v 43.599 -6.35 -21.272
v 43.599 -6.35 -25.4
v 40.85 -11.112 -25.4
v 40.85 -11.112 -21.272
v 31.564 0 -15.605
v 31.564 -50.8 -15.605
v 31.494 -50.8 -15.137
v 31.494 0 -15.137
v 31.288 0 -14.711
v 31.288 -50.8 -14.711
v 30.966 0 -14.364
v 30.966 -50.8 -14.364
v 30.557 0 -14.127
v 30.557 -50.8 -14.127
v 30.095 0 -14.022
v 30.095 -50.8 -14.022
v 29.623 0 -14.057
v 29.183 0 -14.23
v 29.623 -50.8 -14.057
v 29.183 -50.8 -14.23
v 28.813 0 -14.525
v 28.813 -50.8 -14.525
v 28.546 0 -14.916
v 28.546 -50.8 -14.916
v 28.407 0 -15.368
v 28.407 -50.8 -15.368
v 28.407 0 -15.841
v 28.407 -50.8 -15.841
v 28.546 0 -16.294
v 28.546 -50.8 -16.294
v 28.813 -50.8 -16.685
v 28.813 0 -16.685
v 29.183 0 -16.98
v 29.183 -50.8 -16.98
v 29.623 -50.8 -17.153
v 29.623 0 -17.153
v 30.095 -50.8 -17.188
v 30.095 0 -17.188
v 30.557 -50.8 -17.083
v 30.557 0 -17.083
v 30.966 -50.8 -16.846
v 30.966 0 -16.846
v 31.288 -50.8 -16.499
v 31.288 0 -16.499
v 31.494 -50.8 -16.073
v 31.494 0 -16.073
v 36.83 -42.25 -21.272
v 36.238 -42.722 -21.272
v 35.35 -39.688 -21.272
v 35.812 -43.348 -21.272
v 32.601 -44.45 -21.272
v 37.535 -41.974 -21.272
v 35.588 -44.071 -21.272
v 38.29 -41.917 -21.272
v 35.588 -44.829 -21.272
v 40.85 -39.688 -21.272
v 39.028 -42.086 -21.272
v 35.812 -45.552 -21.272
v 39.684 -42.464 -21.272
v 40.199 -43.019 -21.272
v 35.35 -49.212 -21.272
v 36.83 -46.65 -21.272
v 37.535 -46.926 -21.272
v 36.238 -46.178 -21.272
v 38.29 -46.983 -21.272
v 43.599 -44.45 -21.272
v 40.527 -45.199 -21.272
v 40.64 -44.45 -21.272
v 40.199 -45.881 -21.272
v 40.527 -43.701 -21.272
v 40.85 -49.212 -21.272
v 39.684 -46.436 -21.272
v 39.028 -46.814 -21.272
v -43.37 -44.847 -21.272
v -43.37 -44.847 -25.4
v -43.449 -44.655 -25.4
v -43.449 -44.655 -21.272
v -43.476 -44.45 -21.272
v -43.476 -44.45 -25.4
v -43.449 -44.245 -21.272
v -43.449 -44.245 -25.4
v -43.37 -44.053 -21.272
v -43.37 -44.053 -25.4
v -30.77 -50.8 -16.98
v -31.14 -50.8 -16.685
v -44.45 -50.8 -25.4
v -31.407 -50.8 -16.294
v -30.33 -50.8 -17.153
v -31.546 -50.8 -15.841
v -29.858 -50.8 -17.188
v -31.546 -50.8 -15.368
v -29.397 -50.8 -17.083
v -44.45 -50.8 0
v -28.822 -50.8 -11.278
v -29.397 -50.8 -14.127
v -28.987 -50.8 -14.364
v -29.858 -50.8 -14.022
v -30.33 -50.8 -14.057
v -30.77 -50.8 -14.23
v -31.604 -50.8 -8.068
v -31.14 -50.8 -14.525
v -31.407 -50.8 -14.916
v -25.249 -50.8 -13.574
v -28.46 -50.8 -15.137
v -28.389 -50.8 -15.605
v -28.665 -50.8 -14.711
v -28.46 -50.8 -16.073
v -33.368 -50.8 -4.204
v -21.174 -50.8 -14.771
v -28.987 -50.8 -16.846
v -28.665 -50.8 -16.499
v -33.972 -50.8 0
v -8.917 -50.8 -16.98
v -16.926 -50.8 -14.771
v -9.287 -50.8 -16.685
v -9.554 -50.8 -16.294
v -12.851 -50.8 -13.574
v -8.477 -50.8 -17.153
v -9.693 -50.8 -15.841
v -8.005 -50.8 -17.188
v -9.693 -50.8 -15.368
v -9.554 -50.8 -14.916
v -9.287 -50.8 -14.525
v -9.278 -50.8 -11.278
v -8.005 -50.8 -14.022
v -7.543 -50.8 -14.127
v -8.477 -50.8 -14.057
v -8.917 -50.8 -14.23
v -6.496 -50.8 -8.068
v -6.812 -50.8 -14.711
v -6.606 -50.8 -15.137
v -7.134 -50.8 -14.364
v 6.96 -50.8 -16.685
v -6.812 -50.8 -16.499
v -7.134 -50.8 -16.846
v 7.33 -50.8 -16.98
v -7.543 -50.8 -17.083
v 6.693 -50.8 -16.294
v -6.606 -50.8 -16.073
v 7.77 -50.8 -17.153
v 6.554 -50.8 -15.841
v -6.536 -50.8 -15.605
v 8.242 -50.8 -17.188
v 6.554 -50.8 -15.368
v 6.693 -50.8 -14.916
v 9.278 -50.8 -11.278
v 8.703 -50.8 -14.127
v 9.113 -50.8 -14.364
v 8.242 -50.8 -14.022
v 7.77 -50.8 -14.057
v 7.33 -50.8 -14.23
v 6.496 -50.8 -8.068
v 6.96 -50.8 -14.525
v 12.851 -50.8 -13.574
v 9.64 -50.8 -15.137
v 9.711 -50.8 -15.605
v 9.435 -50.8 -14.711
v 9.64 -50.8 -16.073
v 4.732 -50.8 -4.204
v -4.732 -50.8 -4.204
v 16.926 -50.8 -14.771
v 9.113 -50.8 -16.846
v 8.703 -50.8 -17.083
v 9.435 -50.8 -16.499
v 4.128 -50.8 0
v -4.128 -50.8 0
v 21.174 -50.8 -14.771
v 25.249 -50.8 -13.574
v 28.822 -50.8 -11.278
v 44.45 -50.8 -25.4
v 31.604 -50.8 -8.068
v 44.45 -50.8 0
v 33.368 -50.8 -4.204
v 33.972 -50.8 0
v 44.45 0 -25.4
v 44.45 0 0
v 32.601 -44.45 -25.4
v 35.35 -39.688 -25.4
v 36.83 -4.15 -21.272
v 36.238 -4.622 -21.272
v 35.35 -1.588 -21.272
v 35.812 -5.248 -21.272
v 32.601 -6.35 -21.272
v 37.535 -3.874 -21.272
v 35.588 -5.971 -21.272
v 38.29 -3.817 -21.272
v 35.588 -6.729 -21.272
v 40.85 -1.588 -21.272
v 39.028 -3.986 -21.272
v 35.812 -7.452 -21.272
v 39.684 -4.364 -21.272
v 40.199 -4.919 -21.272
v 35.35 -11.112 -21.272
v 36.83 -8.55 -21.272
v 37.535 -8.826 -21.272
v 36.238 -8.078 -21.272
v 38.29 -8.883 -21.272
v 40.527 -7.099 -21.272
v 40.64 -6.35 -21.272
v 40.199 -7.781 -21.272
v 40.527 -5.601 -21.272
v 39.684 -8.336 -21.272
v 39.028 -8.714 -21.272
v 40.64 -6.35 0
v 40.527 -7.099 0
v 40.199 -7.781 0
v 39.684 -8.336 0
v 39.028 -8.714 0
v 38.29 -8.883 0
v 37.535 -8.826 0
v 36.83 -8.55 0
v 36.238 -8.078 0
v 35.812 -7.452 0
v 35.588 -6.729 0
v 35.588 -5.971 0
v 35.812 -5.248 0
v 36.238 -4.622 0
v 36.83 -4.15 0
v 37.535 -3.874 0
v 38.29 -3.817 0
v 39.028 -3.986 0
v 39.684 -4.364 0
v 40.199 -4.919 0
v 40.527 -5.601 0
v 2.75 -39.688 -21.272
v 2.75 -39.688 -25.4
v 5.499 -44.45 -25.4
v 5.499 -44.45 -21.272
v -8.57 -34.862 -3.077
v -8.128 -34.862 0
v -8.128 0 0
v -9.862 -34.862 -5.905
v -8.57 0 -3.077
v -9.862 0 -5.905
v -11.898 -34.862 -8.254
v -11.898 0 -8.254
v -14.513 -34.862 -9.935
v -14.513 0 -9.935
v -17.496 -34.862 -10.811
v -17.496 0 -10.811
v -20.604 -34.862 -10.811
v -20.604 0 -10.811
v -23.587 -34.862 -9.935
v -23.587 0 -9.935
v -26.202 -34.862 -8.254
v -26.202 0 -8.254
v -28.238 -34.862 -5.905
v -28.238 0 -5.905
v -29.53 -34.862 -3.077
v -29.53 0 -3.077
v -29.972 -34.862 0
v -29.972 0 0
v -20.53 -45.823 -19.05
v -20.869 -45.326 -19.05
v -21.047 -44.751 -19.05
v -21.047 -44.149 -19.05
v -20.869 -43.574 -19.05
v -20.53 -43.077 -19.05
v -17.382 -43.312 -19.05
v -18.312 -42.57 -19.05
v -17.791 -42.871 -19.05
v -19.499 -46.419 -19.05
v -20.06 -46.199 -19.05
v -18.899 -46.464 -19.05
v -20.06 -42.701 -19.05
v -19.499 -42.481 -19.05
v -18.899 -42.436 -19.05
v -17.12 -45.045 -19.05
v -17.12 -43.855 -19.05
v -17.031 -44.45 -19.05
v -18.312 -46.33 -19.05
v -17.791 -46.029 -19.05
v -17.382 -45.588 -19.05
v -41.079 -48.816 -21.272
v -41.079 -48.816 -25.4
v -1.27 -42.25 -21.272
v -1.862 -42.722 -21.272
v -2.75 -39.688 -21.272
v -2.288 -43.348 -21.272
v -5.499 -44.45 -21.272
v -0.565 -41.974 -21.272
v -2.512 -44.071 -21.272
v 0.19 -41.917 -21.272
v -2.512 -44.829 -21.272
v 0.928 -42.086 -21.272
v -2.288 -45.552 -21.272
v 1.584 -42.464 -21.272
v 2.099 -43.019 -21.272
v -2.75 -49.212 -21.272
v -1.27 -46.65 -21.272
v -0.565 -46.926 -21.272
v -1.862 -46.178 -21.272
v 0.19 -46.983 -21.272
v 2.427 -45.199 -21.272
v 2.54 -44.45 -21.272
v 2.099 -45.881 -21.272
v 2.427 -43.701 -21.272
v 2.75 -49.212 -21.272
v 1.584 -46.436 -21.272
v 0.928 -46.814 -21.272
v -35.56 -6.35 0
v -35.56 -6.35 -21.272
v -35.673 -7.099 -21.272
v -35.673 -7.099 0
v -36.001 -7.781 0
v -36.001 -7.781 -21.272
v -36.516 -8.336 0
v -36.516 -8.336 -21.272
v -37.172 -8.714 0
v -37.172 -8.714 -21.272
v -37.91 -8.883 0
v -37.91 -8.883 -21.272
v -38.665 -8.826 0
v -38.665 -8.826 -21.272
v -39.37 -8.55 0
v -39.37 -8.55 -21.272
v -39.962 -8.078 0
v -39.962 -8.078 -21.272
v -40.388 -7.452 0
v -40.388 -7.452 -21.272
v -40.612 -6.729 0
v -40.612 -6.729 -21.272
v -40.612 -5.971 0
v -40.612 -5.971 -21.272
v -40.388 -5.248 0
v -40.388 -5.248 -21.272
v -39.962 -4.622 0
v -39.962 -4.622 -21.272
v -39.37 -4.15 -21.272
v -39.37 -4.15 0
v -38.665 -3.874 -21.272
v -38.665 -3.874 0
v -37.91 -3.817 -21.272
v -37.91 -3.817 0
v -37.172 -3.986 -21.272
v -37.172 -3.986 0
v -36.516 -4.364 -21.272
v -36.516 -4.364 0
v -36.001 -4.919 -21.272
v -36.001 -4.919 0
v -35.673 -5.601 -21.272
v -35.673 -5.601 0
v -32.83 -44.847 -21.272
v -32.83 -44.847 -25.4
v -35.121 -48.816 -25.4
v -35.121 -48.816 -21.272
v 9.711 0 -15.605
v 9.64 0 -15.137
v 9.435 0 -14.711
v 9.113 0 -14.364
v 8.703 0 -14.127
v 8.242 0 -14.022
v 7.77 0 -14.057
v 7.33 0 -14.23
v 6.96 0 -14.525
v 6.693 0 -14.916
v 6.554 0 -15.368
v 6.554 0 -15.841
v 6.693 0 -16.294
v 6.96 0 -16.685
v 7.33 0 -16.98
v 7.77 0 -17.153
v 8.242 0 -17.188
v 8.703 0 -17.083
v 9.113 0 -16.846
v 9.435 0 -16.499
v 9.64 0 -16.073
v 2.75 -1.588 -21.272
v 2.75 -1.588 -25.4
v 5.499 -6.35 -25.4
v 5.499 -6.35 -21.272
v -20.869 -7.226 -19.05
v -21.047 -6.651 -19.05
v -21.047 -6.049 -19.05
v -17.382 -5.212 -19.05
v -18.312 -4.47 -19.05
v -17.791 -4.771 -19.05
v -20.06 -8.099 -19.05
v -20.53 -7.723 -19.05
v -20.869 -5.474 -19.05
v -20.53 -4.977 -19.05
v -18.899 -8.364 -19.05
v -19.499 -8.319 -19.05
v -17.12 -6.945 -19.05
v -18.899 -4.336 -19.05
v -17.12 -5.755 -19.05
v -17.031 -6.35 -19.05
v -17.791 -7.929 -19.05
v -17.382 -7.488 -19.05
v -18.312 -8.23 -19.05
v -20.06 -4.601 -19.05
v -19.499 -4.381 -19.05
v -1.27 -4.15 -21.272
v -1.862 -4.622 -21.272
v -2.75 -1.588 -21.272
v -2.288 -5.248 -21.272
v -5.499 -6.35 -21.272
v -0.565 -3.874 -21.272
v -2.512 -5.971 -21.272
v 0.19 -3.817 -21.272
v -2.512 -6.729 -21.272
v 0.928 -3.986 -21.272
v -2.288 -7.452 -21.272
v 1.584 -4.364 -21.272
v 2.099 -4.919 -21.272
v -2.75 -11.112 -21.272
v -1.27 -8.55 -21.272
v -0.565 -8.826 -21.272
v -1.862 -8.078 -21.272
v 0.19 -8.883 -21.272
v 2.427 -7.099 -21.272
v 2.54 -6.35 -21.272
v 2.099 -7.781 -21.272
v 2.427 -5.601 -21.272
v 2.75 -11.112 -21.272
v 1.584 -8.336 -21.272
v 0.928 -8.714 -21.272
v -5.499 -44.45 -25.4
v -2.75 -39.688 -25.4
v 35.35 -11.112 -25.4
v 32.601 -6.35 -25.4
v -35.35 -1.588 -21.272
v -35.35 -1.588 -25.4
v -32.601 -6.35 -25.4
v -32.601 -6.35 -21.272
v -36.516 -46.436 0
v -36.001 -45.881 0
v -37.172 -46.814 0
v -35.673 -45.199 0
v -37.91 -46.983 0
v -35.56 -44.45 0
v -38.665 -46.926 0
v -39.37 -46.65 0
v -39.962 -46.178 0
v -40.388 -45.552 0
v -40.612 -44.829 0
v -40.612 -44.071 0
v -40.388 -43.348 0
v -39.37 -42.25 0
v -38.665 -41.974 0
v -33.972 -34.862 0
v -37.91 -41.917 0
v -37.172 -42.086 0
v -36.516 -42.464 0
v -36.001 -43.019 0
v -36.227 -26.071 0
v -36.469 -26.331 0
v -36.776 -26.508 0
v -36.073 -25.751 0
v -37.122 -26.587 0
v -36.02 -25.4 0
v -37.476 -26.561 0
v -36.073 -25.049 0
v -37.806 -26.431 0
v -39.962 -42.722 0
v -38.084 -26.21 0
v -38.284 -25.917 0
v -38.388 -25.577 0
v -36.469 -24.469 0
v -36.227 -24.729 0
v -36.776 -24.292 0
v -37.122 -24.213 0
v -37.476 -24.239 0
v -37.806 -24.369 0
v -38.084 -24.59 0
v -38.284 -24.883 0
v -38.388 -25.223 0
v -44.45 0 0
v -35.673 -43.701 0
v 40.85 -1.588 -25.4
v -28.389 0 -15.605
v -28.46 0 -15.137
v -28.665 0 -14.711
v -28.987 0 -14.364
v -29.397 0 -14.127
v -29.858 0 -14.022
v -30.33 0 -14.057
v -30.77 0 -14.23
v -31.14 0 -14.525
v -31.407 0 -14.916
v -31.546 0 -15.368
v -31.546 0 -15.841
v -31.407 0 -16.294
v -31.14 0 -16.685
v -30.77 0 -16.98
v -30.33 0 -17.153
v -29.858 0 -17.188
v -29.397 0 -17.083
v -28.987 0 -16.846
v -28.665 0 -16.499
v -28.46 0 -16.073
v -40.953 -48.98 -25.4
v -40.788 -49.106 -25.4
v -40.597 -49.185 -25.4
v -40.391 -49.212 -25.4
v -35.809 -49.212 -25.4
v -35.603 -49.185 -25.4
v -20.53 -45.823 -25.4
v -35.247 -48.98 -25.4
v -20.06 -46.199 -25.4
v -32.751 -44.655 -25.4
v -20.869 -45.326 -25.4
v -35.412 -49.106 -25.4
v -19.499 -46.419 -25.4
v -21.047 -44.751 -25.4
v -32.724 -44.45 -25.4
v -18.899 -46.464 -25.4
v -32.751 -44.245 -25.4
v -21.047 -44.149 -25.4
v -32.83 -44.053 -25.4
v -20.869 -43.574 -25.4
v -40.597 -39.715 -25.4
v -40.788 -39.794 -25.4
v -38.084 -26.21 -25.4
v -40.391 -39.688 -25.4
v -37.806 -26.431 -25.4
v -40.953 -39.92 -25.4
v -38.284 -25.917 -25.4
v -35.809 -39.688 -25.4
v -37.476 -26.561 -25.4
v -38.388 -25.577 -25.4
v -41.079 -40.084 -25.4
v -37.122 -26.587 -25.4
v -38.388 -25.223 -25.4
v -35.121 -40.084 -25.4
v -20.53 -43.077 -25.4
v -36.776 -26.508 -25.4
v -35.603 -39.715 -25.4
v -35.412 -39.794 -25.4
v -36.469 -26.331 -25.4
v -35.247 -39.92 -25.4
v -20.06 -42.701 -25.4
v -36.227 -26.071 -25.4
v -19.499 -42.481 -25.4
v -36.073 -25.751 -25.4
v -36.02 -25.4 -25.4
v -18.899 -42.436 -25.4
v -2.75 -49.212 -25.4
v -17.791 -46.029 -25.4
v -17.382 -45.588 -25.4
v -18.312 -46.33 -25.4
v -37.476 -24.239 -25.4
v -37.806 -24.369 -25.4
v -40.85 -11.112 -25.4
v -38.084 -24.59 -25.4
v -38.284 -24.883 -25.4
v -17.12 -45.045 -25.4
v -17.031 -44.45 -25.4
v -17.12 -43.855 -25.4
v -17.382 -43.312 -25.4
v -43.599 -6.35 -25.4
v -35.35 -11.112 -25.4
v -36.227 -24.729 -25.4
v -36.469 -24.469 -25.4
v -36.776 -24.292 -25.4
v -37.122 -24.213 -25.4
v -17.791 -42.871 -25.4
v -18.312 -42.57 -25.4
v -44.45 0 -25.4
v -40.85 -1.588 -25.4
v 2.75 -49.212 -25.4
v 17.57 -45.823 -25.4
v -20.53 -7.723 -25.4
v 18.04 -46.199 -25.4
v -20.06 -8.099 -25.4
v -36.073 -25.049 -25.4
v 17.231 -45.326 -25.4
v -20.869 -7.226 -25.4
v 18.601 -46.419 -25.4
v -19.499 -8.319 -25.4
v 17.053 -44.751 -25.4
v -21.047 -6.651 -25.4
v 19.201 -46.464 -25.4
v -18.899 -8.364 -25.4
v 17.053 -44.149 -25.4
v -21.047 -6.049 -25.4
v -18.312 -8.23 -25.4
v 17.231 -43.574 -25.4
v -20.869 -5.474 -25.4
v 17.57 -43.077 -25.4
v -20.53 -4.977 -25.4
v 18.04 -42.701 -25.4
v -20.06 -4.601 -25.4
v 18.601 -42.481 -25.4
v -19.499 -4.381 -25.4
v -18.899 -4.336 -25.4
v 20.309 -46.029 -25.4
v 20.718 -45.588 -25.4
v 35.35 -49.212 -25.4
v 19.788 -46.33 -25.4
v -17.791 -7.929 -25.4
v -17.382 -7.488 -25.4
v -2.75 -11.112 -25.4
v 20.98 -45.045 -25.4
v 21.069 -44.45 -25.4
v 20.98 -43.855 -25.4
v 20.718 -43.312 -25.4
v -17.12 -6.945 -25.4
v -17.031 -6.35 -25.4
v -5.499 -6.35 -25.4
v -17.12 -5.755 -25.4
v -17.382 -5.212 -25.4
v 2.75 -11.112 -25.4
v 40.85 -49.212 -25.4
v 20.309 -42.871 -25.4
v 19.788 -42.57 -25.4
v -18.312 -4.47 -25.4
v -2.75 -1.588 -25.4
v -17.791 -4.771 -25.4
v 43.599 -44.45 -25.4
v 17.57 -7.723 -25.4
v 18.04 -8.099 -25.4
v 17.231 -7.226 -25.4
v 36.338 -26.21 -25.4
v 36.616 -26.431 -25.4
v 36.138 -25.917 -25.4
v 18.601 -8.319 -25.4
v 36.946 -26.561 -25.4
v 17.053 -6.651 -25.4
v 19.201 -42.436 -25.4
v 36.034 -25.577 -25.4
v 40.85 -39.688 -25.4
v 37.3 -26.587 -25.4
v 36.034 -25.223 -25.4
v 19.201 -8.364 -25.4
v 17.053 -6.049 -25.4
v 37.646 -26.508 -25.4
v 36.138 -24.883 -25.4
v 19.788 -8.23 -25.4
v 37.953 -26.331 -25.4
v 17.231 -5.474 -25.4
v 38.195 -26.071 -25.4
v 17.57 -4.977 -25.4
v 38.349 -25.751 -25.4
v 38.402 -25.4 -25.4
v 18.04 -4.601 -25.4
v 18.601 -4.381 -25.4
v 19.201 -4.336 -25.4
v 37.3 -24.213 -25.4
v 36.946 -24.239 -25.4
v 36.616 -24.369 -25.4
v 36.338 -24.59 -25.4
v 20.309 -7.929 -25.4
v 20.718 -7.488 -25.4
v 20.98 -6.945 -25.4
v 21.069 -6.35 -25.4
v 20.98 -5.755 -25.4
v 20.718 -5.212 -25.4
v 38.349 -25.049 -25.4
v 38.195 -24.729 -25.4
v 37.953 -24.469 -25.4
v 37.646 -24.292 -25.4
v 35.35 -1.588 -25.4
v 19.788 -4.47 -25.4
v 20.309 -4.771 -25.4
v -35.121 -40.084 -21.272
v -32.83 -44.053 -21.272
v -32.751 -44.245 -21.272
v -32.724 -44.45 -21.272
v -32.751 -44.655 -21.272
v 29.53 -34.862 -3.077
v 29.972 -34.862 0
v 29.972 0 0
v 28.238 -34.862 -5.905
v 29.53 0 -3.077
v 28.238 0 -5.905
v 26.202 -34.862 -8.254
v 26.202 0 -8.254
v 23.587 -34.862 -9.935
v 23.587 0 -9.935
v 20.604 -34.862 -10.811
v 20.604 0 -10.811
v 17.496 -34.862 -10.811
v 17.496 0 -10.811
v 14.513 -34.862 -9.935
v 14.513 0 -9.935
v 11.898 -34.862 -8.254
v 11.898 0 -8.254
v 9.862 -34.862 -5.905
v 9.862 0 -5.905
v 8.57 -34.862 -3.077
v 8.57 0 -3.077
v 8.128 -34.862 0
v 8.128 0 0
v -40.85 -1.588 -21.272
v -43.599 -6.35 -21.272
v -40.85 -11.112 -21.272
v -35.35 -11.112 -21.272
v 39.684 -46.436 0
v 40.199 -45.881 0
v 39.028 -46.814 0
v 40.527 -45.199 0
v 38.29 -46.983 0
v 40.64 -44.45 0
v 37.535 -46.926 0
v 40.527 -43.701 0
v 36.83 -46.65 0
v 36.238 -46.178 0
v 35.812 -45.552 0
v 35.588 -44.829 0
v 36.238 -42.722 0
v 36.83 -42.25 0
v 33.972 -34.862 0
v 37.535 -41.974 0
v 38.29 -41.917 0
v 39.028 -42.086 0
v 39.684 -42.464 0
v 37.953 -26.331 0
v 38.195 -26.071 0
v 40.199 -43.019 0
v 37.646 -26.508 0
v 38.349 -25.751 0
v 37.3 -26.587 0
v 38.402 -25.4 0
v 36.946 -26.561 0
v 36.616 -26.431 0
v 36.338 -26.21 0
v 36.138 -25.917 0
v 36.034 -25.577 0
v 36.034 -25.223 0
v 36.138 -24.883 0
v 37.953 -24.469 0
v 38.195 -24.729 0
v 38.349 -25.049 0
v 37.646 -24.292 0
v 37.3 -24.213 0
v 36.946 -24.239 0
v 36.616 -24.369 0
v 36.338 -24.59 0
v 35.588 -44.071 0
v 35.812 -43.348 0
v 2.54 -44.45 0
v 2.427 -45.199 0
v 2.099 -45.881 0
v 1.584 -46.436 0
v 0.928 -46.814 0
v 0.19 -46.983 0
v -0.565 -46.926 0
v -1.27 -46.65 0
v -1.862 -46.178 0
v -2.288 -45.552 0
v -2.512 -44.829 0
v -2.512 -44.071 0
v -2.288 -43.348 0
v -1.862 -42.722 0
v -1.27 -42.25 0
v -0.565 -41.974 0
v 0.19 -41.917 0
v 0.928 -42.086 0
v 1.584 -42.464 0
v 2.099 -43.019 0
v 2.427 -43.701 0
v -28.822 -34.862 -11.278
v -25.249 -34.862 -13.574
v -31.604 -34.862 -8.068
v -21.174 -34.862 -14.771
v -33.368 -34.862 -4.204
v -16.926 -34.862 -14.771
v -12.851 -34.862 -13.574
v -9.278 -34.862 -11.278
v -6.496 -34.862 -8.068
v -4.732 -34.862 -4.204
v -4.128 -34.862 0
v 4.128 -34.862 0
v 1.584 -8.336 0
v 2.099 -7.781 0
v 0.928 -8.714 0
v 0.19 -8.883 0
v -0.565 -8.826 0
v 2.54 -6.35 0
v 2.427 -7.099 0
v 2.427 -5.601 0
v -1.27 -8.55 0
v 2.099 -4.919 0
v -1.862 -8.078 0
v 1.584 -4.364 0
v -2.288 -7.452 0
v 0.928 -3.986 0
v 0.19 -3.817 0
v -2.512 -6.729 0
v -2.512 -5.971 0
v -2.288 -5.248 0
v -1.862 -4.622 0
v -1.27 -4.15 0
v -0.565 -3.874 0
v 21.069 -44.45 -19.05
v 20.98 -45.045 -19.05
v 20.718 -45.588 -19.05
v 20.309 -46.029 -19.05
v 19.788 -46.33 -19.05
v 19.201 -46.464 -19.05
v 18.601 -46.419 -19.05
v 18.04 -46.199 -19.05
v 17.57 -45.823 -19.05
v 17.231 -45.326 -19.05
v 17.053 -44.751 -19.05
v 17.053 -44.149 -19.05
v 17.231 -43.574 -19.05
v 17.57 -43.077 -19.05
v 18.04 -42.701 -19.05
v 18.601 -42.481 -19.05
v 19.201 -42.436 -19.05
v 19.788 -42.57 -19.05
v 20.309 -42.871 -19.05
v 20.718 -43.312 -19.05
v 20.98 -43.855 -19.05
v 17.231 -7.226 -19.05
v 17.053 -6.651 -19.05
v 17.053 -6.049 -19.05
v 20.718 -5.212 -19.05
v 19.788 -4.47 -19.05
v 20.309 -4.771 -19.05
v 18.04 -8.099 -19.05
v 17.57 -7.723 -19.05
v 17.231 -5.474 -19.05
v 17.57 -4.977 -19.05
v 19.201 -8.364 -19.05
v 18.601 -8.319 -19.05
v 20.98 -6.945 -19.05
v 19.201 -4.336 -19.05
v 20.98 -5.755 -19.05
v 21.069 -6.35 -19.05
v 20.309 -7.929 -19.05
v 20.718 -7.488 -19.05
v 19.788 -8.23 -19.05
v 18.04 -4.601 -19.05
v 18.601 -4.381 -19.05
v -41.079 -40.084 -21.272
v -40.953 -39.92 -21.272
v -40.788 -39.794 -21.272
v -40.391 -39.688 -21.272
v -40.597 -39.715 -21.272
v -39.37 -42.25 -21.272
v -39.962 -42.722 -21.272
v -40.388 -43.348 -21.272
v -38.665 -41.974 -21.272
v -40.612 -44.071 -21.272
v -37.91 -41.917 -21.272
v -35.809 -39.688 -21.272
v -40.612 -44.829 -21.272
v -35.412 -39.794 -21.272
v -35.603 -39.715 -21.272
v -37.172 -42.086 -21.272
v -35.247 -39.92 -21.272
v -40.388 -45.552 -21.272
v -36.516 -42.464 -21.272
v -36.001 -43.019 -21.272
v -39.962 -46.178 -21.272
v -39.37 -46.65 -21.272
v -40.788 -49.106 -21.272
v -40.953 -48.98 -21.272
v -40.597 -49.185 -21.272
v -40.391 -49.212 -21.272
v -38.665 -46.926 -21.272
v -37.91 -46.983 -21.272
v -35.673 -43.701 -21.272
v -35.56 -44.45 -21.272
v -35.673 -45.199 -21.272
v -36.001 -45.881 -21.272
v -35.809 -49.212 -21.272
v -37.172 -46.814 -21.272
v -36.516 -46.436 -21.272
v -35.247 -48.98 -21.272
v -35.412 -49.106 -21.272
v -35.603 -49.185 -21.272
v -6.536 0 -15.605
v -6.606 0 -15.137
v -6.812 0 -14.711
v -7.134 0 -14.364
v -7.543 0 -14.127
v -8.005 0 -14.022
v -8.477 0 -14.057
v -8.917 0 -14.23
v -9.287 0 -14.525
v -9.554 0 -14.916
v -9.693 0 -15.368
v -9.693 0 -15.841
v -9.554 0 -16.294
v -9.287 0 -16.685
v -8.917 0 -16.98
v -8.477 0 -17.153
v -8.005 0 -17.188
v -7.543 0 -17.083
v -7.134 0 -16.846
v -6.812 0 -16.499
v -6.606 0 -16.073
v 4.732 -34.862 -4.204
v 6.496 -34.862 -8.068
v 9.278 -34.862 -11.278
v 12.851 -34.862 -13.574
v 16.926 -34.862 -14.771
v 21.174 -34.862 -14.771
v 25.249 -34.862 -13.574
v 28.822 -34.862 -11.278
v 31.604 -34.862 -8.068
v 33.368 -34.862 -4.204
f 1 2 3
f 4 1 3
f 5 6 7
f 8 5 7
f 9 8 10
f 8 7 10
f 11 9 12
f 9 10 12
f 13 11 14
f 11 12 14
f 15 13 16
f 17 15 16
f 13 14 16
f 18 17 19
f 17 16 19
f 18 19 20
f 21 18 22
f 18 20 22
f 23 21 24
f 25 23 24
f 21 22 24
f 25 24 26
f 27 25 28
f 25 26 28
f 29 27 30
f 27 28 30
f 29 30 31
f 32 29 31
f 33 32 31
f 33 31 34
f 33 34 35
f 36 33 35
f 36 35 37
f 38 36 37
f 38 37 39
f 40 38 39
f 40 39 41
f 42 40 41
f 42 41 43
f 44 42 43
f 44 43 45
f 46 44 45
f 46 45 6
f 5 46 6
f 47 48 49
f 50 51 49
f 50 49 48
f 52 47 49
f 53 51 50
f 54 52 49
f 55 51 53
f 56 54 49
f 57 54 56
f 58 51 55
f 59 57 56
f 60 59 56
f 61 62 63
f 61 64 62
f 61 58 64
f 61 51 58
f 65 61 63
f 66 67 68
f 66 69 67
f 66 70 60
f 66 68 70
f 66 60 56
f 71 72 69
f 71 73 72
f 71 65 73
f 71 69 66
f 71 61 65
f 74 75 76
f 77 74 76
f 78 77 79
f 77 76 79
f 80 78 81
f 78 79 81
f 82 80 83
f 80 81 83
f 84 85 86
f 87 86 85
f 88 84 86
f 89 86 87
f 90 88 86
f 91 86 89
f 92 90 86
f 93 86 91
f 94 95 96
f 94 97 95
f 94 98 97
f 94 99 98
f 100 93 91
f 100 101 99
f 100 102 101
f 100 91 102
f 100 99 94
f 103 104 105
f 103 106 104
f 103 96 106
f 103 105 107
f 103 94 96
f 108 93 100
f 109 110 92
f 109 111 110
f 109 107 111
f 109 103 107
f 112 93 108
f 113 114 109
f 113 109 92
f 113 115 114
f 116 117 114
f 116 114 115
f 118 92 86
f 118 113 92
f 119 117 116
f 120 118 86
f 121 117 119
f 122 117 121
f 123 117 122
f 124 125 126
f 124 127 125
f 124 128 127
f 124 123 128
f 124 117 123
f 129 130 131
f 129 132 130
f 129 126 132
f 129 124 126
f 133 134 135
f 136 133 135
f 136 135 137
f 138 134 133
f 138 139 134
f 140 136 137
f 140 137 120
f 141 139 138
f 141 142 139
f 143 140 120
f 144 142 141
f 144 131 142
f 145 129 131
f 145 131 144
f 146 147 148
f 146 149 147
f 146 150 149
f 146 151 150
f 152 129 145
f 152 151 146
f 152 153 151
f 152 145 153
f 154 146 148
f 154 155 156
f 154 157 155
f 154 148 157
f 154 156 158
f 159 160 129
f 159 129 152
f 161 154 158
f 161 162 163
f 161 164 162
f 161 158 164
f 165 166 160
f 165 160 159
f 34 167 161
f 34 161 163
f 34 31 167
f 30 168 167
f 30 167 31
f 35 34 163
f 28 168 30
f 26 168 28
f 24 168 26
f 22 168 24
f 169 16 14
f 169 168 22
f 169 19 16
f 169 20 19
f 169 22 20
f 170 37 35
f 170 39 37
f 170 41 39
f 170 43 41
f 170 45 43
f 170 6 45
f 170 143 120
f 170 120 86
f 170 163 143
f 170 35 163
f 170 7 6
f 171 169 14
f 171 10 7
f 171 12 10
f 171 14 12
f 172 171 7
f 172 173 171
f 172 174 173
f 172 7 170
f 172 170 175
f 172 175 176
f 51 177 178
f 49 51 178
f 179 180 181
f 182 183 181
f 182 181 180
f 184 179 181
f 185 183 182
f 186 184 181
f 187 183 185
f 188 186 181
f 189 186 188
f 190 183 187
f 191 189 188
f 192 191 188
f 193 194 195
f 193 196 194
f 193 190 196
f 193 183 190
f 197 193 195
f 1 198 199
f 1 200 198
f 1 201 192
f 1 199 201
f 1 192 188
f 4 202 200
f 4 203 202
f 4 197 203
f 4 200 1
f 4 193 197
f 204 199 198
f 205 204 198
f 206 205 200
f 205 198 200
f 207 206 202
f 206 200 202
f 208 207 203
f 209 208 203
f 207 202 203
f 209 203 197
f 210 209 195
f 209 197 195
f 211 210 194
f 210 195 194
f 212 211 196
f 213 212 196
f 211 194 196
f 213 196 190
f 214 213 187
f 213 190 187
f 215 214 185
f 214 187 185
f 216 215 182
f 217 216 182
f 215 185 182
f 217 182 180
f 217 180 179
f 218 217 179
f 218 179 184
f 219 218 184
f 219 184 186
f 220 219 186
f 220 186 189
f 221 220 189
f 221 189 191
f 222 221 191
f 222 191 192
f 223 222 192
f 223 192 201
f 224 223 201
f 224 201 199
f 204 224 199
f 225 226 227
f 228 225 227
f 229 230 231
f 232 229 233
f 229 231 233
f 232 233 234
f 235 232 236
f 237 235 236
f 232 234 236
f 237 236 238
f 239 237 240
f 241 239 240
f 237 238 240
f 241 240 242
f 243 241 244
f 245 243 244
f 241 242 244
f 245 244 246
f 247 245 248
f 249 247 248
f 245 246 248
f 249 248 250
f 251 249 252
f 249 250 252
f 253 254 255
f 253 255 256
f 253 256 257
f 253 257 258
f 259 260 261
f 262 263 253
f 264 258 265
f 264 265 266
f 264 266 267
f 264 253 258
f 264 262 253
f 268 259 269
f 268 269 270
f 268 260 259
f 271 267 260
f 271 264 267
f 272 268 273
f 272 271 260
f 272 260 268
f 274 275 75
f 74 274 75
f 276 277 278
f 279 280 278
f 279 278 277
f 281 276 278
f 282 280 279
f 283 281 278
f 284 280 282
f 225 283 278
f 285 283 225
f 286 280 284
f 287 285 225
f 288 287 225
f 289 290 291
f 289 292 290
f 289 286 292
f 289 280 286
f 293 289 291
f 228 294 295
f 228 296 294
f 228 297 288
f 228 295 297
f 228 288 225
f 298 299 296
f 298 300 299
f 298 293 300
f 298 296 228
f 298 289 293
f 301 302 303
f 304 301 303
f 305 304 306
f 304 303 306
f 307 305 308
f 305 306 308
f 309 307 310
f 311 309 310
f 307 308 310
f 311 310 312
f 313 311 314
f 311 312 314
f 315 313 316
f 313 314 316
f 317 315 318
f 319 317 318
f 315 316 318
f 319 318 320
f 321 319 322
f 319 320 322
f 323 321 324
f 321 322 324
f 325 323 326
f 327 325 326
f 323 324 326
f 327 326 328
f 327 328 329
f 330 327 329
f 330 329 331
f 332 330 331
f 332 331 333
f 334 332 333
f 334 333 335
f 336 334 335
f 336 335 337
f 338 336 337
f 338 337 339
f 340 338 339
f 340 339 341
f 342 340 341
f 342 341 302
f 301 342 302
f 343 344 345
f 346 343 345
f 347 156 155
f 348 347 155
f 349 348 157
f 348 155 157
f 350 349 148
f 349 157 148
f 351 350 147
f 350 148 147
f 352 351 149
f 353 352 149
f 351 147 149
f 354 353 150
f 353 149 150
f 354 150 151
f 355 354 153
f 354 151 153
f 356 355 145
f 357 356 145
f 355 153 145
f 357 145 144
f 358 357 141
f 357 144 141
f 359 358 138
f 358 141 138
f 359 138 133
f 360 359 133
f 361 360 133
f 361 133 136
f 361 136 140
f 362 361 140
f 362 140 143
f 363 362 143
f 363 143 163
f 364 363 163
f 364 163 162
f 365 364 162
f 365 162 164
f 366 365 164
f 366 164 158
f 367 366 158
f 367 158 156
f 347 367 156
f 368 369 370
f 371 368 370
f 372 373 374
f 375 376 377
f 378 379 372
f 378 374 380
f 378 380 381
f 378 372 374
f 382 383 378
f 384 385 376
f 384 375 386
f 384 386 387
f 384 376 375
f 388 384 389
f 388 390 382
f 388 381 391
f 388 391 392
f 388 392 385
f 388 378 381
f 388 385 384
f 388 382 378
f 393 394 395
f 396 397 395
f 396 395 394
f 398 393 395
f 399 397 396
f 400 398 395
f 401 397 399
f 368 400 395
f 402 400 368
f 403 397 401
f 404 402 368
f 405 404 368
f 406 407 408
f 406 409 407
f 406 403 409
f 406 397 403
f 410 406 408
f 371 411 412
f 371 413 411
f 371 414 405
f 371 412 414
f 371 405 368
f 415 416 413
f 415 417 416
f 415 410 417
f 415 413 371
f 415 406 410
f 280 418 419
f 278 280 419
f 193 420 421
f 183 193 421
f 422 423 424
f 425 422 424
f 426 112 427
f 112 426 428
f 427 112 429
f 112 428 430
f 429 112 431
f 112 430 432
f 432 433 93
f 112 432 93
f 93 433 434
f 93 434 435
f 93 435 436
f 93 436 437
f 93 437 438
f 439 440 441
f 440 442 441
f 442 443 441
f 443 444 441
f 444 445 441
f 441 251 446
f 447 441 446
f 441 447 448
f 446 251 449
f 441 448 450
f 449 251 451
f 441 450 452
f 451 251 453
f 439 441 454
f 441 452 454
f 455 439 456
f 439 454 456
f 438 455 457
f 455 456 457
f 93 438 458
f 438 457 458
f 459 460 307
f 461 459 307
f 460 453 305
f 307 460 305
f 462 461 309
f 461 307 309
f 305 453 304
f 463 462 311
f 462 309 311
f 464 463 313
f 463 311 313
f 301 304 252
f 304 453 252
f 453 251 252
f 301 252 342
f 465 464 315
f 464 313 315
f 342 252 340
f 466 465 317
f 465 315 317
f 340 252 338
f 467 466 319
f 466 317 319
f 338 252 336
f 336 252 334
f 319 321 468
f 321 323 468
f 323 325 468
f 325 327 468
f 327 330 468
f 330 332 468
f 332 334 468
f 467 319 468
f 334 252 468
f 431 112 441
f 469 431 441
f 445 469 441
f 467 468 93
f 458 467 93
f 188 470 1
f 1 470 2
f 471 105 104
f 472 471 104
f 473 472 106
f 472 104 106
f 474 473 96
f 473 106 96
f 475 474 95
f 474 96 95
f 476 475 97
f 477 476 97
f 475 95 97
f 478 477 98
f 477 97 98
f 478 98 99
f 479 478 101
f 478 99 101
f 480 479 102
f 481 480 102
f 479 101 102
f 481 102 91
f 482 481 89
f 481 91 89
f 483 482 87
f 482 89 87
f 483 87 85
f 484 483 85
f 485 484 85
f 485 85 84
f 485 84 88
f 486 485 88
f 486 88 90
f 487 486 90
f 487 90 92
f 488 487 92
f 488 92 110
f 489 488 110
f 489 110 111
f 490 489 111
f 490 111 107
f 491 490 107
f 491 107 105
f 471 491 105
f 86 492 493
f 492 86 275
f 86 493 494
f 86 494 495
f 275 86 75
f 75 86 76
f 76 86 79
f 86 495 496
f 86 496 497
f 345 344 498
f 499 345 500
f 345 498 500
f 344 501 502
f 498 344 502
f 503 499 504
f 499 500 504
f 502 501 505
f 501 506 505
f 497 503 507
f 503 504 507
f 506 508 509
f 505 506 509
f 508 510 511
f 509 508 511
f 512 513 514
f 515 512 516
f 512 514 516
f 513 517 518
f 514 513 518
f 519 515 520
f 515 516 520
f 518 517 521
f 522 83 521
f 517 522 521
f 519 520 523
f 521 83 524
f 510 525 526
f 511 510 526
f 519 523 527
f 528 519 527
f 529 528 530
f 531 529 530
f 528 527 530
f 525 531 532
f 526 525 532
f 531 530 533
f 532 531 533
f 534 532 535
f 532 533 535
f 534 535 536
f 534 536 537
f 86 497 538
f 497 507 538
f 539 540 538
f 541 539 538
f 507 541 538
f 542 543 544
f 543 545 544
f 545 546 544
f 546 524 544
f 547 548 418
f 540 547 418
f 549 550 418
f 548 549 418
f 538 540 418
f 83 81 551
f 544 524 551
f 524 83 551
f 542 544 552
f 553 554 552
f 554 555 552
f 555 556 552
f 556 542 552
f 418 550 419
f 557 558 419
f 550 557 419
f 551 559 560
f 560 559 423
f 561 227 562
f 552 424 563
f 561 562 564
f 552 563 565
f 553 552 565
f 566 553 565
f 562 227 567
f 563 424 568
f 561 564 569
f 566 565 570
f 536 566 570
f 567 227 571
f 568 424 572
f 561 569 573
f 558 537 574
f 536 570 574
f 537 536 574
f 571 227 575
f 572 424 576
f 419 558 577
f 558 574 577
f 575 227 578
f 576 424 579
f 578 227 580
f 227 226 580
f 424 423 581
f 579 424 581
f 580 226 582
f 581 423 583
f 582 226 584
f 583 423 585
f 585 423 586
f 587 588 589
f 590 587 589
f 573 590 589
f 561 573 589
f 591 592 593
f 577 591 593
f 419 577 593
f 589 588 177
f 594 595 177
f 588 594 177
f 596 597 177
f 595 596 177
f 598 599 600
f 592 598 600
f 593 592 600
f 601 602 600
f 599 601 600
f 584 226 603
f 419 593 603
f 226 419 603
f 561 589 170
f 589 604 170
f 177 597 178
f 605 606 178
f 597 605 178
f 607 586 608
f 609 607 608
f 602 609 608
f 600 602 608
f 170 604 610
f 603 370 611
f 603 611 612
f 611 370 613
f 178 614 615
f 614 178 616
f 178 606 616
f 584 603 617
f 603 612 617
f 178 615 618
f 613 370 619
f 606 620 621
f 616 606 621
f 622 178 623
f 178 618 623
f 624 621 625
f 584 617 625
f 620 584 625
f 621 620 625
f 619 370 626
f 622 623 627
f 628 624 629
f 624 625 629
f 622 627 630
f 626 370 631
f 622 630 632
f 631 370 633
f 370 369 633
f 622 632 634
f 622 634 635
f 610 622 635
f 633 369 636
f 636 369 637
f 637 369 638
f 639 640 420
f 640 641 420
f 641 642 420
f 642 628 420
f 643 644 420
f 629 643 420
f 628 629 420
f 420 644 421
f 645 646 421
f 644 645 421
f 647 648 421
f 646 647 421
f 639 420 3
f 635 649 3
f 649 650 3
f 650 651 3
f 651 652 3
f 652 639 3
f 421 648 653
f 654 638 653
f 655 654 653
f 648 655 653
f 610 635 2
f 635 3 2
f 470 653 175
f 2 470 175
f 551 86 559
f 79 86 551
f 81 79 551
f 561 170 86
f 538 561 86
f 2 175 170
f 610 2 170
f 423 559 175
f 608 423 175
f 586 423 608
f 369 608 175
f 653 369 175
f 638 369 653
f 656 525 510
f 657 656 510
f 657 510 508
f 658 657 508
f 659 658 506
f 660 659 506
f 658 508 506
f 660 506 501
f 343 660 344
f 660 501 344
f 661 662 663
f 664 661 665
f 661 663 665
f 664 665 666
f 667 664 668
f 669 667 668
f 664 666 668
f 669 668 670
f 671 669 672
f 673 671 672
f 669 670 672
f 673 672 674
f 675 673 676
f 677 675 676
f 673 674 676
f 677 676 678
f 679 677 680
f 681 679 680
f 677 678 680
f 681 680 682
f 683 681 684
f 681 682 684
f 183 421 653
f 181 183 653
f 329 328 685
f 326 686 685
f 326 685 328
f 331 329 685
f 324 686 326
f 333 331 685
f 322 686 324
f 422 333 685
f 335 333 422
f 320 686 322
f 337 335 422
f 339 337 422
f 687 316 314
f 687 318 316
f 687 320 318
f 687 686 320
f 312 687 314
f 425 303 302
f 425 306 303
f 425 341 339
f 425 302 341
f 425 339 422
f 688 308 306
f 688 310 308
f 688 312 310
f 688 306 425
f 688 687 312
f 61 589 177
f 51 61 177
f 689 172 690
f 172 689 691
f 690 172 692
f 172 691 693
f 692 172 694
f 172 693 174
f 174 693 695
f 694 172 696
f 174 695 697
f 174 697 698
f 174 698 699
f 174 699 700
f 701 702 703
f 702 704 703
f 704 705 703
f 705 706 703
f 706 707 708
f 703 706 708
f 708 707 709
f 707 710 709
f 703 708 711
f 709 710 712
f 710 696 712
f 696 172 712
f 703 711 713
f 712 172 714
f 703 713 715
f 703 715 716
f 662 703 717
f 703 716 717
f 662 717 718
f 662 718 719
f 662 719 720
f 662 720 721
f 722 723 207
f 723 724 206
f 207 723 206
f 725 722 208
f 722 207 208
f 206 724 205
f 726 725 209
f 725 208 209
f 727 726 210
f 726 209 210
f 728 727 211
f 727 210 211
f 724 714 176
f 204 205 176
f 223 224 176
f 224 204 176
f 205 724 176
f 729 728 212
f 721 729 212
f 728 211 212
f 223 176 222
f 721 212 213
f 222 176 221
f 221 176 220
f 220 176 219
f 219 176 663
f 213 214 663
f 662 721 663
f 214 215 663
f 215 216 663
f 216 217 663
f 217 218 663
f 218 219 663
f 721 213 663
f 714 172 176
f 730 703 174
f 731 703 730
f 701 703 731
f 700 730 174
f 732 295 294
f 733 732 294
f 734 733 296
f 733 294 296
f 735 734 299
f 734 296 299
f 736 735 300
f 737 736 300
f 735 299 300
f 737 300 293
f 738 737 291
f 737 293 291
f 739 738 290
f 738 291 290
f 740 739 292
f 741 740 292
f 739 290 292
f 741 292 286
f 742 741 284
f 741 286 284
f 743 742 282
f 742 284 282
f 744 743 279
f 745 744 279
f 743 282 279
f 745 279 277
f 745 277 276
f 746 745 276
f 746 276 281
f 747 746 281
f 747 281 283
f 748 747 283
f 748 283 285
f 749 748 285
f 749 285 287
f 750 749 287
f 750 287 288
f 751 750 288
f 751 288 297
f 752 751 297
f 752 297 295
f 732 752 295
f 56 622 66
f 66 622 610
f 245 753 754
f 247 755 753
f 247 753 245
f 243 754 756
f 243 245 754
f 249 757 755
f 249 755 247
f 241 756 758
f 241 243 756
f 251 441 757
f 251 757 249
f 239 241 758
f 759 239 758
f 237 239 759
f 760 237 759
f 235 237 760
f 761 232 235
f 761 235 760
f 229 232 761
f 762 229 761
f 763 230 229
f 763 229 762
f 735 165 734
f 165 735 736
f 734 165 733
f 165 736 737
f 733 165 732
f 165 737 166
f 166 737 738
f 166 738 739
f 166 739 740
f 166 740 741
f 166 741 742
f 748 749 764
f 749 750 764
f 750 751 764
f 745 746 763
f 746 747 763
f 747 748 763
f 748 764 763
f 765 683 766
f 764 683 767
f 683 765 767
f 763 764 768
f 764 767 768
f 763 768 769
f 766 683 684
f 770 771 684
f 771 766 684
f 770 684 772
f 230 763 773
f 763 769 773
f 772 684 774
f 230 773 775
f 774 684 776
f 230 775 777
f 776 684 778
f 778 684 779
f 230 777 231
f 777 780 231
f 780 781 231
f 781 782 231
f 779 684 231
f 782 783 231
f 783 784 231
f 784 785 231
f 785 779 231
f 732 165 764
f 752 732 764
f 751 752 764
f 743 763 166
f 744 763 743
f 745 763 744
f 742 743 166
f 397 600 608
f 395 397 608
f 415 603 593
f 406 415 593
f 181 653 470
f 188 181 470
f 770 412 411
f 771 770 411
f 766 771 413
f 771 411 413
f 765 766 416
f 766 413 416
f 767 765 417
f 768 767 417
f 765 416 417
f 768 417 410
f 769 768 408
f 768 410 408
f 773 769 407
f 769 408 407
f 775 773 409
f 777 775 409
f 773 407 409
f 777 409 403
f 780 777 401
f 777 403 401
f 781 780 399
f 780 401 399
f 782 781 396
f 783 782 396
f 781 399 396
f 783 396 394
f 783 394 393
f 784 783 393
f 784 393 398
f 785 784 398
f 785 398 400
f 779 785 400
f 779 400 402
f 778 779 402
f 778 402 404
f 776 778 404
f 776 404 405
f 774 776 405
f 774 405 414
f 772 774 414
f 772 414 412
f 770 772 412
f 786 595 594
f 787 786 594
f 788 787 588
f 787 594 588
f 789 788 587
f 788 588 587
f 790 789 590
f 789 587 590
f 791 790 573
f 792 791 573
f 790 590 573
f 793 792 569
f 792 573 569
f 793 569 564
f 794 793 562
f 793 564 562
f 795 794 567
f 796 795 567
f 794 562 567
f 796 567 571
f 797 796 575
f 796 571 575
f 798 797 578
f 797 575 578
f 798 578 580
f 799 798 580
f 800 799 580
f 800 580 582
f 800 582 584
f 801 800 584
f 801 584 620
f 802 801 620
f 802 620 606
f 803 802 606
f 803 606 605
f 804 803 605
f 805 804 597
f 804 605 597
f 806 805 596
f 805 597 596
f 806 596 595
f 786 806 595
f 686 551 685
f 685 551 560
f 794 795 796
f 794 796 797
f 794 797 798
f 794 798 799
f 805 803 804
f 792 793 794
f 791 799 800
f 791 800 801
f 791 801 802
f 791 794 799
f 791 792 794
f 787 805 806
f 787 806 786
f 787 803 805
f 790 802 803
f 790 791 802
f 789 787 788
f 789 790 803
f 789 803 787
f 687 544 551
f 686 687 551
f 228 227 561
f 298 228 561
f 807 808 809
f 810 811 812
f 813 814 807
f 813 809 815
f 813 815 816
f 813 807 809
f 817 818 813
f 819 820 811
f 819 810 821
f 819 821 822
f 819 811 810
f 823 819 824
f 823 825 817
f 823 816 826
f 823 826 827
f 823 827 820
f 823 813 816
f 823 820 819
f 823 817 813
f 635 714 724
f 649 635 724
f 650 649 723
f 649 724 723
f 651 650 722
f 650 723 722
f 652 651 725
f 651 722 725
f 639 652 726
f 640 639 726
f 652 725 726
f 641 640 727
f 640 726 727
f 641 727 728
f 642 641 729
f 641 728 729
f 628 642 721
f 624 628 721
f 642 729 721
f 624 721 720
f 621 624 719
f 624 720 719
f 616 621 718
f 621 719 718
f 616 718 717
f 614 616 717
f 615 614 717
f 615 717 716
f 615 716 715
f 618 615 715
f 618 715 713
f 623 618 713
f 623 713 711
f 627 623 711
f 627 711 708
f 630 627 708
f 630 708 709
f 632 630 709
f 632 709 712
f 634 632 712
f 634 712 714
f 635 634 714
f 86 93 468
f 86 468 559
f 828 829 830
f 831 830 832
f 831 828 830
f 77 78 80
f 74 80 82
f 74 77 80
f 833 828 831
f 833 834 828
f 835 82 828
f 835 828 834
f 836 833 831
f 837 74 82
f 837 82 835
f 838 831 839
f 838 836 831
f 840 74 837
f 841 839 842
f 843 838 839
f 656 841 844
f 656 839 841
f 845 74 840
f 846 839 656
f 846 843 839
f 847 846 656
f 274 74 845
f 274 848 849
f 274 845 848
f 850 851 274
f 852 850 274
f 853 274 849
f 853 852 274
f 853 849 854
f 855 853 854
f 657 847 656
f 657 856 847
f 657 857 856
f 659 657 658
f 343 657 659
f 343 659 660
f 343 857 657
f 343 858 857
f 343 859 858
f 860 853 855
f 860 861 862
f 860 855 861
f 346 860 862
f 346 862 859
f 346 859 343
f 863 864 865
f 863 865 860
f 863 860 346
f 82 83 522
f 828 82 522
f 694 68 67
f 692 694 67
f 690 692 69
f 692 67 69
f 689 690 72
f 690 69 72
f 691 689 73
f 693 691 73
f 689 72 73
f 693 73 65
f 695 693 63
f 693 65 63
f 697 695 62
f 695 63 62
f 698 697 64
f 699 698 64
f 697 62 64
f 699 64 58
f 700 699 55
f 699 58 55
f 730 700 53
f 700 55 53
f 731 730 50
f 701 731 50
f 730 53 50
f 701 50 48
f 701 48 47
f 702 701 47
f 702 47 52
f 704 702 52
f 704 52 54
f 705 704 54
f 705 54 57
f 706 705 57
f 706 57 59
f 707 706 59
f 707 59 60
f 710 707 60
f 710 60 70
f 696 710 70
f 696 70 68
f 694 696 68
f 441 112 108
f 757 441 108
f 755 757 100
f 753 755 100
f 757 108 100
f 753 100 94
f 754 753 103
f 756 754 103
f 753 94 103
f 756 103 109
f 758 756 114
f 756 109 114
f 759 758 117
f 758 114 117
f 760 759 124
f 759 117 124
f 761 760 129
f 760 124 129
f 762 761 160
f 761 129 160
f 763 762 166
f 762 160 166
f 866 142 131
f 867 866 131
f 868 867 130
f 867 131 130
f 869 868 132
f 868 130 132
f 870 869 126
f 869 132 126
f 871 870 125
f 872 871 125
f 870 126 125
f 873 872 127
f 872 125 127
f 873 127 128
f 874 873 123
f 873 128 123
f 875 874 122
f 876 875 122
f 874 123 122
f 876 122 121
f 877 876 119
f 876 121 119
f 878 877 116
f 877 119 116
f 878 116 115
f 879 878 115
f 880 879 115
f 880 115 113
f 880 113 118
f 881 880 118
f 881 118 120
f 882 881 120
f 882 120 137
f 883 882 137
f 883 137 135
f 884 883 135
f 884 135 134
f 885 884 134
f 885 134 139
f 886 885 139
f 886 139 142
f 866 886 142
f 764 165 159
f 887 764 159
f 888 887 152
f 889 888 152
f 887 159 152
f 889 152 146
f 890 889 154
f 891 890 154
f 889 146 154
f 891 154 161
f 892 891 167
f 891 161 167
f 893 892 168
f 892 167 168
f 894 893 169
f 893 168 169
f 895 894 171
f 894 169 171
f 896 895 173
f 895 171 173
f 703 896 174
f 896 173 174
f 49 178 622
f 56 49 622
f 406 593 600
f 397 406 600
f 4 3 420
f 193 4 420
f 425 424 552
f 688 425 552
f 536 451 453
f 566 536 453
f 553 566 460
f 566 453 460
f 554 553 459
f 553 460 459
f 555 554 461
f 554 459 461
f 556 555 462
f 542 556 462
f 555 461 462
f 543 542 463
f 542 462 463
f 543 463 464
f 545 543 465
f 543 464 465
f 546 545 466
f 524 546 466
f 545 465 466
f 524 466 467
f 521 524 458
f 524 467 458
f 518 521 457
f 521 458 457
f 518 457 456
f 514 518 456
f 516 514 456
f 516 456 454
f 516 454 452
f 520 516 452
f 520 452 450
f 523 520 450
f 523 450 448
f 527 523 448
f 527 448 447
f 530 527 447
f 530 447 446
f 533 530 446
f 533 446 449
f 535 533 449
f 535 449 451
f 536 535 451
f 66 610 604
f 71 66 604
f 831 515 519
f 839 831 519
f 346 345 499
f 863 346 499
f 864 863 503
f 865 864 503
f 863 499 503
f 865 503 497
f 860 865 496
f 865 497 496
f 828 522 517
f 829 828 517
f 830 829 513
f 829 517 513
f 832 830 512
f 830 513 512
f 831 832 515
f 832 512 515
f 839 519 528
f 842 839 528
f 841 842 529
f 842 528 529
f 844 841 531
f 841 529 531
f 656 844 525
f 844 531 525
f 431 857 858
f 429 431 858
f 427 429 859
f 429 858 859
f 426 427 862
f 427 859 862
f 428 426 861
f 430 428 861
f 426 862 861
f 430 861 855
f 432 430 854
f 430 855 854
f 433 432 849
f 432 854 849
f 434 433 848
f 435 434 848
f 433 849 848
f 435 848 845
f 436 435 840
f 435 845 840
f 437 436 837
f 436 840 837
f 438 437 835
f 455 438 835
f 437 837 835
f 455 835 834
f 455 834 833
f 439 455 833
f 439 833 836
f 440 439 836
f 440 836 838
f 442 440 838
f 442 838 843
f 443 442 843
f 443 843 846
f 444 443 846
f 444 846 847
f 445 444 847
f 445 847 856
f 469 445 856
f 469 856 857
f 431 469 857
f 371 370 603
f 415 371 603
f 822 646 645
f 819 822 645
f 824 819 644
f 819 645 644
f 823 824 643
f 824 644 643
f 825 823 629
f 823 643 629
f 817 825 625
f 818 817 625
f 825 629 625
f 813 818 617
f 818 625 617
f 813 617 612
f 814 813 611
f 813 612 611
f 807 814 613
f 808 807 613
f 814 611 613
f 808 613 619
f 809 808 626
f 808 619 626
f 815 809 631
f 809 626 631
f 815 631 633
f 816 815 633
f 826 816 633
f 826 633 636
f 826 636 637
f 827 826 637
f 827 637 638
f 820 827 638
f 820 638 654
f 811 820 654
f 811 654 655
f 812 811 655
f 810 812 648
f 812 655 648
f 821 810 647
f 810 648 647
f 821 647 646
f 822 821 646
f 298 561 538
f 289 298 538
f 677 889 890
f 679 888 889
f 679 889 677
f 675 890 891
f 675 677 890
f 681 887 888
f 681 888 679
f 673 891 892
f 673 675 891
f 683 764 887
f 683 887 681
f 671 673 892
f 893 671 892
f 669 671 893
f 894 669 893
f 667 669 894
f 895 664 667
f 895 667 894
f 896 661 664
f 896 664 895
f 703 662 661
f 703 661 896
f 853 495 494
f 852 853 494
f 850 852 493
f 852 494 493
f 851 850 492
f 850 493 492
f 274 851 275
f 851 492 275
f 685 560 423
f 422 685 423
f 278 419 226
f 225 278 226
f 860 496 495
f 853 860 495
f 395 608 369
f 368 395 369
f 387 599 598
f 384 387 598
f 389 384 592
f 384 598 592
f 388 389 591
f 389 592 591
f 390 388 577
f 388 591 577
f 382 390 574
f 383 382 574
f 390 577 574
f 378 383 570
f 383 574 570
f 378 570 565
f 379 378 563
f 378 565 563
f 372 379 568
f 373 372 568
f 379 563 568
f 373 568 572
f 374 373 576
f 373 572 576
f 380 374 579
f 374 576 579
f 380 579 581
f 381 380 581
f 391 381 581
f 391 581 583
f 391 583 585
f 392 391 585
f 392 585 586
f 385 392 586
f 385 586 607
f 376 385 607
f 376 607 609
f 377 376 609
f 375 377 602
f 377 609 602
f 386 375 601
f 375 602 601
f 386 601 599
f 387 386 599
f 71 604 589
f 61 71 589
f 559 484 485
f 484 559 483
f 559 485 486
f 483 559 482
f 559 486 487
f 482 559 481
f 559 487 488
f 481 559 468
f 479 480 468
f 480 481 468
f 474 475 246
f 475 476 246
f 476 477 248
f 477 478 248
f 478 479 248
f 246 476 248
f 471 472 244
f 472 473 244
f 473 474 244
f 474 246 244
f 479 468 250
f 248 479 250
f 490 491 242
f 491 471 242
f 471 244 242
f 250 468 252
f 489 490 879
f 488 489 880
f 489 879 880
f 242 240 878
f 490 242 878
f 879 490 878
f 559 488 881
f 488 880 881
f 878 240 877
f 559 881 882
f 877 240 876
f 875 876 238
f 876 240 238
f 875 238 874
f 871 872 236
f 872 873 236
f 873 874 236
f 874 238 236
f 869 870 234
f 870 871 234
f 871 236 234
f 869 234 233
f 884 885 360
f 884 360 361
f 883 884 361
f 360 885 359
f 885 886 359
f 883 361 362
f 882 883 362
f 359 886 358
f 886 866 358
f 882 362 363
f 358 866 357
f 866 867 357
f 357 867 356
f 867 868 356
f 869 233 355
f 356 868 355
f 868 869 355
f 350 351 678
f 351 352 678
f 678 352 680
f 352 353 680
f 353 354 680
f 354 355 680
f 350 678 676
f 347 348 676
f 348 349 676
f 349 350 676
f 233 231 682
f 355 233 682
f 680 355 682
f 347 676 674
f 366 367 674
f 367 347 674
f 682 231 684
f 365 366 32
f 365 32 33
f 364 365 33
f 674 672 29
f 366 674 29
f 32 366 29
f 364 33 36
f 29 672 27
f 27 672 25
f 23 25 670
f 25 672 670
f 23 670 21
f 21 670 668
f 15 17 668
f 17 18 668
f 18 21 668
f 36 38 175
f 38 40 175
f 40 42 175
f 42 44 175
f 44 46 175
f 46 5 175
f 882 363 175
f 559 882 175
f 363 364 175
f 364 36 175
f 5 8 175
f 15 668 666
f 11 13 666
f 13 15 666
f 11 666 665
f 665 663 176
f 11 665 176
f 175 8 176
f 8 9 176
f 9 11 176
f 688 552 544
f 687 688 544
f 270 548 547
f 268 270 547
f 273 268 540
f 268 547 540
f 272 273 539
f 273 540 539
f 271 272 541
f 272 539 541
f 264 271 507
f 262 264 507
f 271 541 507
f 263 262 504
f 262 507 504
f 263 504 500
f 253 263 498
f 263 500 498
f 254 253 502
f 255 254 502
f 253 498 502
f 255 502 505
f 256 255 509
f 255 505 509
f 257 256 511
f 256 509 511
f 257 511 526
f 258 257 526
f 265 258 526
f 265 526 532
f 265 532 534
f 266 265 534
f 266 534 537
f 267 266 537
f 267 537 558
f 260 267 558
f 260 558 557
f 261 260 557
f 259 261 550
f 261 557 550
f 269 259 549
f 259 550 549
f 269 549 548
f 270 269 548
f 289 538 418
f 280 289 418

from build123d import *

# Parameters (mm, degrees)
F1_DEPTH  = 50.8
F2_R      = 14.9225
F3_DEPTH  = 15.9385
F4_R      = 2.54
F5_DEPTH  = 25.401
F6_R      = 1.190625
F7_DEPTH  = 25.401
F8_R      = 1.190625
F9_DEPTH  = 25.401
F10_R     = 2.0193
F11_DEPTH = 6.35
F13_DEPTH = 4.1275
F14_R     = 1.5875
F15_DEPTH = 50.801


with BuildPart() as f1:
    # F0 (on Front) → F1 (new body)
    with BuildSketch(Plane.XZ):
        with BuildLine():
            Line((-29.972, 0), (-44.45, 0))
            Line((-44.45, 0), (-44.45, -25.4))
            Line((-44.45, -25.4), (44.45, -25.4))
            Line((44.45, -25.4), (44.45, 0))
            Line((44.45, 0), (29.972, 0))
            ThreePointArc((29.972, 0), (19.05, -10.922), (8.128, 0))
            Line((8.128, 0), (-8.128, 0))
            ThreePointArc((-8.128, 0), (-19.05, -10.922), (-29.972, 0))
        make_face()
    extrude(amount=F1_DEPTH)

    # F2 (on face) → F3 (cut)
    with BuildSketch(Plane.XZ.offset(50.8)):
        with Locations((-19.05, 0)):
            Circle(F2_R)
        with Locations((19.05, 0)):
            Circle(F2_R)
    extrude(amount=-F3_DEPTH, mode=Mode.SUBTRACT)

    # F4 (on face) → F5 (cut, through all)
    with BuildSketch(Plane(origin=(0, 0, -25.4), x_dir=(1, 0, 0), z_dir=(0, 0, -1))):
        with Locations((-38.1, 44.45)):
            Circle(F4_R)
        with Locations((0, 44.45)):
            Circle(F4_R)
        with Locations((38.1, 44.45)):
            Circle(F4_R)
        with Locations((38.1, 6.35)):
            Circle(F4_R)
        with Locations((0, 6.35)):
            Circle(F4_R)
        with Locations((-38.1, 6.35)):
            Circle(F4_R)
    extrude(amount=-F5_DEPTH, mode=Mode.SUBTRACT)

    # F6 (on face) → F7 (cut, through all)
    with BuildSketch(Plane.XY):
        with Locations((37.211, -25.4)):
            Circle(F6_R)
    extrude(amount=-F7_DEPTH, mode=Mode.SUBTRACT)

    # F8 (on face) → F9 (cut, through all)
    with BuildSketch(Plane.XY):
        with Locations((-37.211, -25.4)):
            Circle(F8_R)
    extrude(amount=-F9_DEPTH, mode=Mode.SUBTRACT)

    # F10 (on face) + F8 (on face) → F11 (cut)
    with BuildSketch(Plane(origin=(0, 0, -25.4), x_dir=(1, 0, 0), z_dir=(0, 0, -1))):
        with Locations((-19.05, 6.35)):
            Circle(F10_R)
        with Locations((-19.05, 44.45)):
            Circle(F10_R)
        with Locations((19.05, 44.45)):
            Circle(F10_R)
        with Locations((19.05, 6.35)):
            Circle(F10_R)
    with BuildSketch(Plane.XY):
        with Locations((-37.211, -25.4)):
            Circle(F8_R)
    extrude(amount=-F11_DEPTH, mode=Mode.SUBTRACT)

    # F12 (on face) → F13 (cut)
    with BuildSketch(Plane(origin=(0, 0, -25.4), x_dir=(1, 0, 0), z_dir=(0, 0, -1))):
        with BuildLine():
            Line((-35.808641, 49.2125), (-40.391359, 49.2125))
            ThreePointArc((-40.391359, 49.2125), (-40.788234, 49.106158), (-41.078767, 48.815625))
            Line((-41.078767, 48.815625), (-43.370125, 44.846875))
            ThreePointArc((-43.370125, 44.846875), (-43.476468, 44.45), (-43.370125, 44.053125))
            Line((-43.370125, 44.053125), (-41.078767, 40.084375))
            ThreePointArc((-41.078767, 40.084375), (-40.788234, 39.793842), (-40.391359, 39.6875))
            Line((-40.391359, 39.6875), (-35.808641, 39.6875))
            ThreePointArc((-35.808641, 39.6875), (-35.411766, 39.793842), (-35.121233, 40.084375))
            Line((-35.121233, 40.084375), (-32.829875, 44.053125))
            ThreePointArc((-32.829875, 44.053125), (-32.723532, 44.45), (-32.829875, 44.846875))
            Line((-32.829875, 44.846875), (-35.121233, 48.815625))
            ThreePointArc((-35.121233, 48.815625), (-35.411766, 49.106158), (-35.808641, 49.2125))
        make_face()
        Polygon((2.749631, 49.2125), (-2.749631, 49.2125), (-5.499261, 44.45), (-2.749631, 39.6875), (2.749631, 39.6875), (5.499261, 44.45), align=None)
        Polygon((40.849631, 49.2125), (35.350369, 49.2125), (32.600739, 44.45), (35.350369, 39.6875), (40.849631, 39.6875), (43.599261, 44.45), align=None)
        Polygon((40.849631, 11.1125), (35.350369, 11.1125), (32.600739, 6.35), (35.350369, 1.5875), (40.849631, 1.5875), (43.599261, 6.35), align=None)
        Polygon((2.749631, 11.1125), (-2.749631, 11.1125), (-5.499261, 6.35), (-2.749631, 1.5875), (2.749631, 1.5875), (5.499261, 6.35), align=None)
        Polygon((-35.350369, 11.1125), (-40.849631, 11.1125), (-43.599261, 6.35), (-40.849631, 1.5875), (-35.350369, 1.5875), (-32.600739, 6.35), align=None)
    extrude(amount=-F13_DEPTH, mode=Mode.SUBTRACT)

    # F14 (on face) → F15 (cut, through all)
    with BuildSketch(Plane.XZ.offset(50.8)):
        with Locations((29.976631, -15.604846)):
            Circle(F14_R)
        with Locations((8.123369, -15.604846)):
            Circle(F14_R)
        with Locations((-8.123369, -15.604846)):
            Circle(F14_R)
        with Locations((-29.976631, -15.604846)):
            Circle(F14_R)
    extrude(amount=-F15_DEPTH, mode=Mode.SUBTRACT)


solid = f1.part
